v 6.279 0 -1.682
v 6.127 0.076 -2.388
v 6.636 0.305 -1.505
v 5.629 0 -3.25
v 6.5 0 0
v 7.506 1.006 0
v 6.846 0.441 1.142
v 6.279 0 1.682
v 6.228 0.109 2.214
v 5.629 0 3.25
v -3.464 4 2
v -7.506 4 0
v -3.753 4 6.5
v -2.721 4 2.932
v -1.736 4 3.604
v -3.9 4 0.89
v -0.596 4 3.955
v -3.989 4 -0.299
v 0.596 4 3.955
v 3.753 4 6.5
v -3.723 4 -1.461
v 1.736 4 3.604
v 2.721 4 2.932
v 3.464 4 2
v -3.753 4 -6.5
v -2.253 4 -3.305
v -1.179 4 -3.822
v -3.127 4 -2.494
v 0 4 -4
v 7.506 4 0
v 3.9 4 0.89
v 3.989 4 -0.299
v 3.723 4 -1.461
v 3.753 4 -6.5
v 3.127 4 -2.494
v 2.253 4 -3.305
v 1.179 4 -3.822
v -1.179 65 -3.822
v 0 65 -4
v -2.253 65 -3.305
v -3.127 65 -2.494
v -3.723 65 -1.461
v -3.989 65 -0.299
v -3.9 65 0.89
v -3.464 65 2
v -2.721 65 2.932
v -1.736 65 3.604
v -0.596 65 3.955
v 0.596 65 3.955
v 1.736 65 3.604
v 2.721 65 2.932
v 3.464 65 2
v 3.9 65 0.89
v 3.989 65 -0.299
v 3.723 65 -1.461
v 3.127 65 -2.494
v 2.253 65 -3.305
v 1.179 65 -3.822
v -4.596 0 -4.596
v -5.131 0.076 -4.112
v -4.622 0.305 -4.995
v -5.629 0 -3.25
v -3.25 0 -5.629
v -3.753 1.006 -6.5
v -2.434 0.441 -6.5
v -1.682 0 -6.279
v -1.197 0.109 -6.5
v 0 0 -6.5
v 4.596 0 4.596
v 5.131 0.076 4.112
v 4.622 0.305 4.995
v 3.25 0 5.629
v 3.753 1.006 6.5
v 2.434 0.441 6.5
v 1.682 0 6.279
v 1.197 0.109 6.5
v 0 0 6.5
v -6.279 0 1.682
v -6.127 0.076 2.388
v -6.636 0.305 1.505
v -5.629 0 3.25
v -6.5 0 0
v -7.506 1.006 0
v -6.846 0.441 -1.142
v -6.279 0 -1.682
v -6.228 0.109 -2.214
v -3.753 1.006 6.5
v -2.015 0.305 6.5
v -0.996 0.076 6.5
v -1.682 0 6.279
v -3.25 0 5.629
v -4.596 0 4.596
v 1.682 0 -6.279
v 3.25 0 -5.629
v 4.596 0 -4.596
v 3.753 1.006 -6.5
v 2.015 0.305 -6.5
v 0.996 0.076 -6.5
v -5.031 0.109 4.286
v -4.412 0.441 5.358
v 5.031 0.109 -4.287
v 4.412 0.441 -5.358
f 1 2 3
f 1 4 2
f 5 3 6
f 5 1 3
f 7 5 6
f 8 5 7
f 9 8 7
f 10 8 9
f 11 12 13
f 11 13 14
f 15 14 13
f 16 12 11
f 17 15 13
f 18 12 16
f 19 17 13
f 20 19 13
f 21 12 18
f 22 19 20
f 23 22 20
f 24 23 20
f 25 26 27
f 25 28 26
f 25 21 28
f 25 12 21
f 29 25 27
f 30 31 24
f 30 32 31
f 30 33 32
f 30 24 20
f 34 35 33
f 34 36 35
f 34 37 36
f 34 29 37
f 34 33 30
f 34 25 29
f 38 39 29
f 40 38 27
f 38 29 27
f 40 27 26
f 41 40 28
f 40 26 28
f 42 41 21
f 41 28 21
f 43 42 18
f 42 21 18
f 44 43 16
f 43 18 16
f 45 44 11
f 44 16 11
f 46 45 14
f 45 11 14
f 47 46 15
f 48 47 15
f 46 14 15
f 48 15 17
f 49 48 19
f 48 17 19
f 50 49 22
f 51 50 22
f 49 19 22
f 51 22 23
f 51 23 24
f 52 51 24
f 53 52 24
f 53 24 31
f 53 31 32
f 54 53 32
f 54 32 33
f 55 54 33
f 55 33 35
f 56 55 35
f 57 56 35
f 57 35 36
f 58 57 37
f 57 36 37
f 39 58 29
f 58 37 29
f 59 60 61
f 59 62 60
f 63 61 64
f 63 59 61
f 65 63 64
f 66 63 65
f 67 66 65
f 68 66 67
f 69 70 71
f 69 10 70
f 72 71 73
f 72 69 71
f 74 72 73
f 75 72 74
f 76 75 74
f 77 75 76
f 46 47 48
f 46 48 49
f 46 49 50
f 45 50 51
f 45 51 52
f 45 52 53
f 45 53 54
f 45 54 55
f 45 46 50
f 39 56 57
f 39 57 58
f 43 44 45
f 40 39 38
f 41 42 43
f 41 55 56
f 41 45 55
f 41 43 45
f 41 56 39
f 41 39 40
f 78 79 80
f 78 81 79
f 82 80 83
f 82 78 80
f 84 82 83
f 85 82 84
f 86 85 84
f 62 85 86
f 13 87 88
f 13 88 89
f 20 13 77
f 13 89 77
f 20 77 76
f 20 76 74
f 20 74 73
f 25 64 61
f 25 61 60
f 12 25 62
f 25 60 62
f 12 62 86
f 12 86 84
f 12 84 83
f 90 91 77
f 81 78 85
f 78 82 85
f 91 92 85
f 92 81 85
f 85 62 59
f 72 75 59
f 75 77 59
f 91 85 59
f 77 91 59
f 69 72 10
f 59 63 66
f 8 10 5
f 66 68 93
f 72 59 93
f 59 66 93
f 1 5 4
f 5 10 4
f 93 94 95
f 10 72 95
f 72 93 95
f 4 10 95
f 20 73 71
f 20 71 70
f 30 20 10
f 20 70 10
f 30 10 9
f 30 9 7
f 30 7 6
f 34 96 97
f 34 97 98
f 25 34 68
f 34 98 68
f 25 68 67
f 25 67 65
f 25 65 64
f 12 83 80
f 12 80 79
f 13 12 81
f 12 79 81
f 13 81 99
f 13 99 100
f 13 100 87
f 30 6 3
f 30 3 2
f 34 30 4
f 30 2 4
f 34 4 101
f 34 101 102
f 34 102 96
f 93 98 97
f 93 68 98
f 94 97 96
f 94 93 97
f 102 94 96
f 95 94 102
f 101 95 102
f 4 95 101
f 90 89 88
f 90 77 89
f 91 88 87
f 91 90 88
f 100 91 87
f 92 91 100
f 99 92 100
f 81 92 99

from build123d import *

# Parameters (mm, degrees)
BOSS_EXTRUDE1_DEPTH = 4
SKETCH2_OUTSIDE_W   = 44.472
SKETCH2_OUTSIDE_H   = 42.46
SKETCH2_OUTSIDE_R   = 6.5
CUT_EXTRUDE2_DEPTH  = 11.704360482
CUT_EXTRUDE2_DRAFT  = -45
SKETCH3_R           = 4
BOSS_EXTRUDE2_DEPTH = 61


with BuildPart() as part:
    # Sketch1 → Boss-Extrude1 (new body)
    with BuildSketch(Plane(origin=(0, 0, 0), x_dir=(1, 0, 0), z_dir=(0, 1, 0))):
        Polygon((7.505553499, 0), (3.75277675, 6.5), (-3.75277675, 6.5), (-7.505553499, 0), (-3.75277675, -6.5), (3.75277675, -6.5), align=None)
    extrude(amount=BOSS_EXTRUDE1_DEPTH)


with BuildPart() as cut_extrude2_tool:
    # Sketch2 outside → Cut-Extrude2 (with draft: the straight prism first)
    with BuildSketch(Plane(origin=(0, 0, 0), x_dir=(-1, 0, 0), z_dir=(0, -1, 0))):
        Rectangle(SKETCH2_OUTSIDE_W, SKETCH2_OUTSIDE_H)
        Circle(SKETCH2_OUTSIDE_R, mode=Mode.SUBTRACT)
    extrude(amount=-CUT_EXTRUDE2_DEPTH)
    # Cut-Extrude2: the draft: its side faces are tilted about the plane it starts from
    cut_extrude2_sides = [cut_extrude2_tool.faces().sort_by_distance(p)[0] for p in [
        (0, 5.852180241, 21.23),
        (-22.236, 5.852180241, 0),
        (0, 5.852180241, -21.23),
        (22.236, 5.852180241, 0),
        (6.5, 5.852180241, 0),
    ]]
    draft(cut_extrude2_sides, Plane(origin=(0, 0, 0), x_dir=(-1, 0, 0), z_dir=(0, -1, 0)), CUT_EXTRUDE2_DRAFT)


with BuildPart() as part_1:
    add(part.part)

    # Cut-Extrude2: cut by cut_extrude2_tool
    add(cut_extrude2_tool.part, mode=Mode.SUBTRACT)

    # Sketch3 → Boss-Extrude2 (add)
    with BuildSketch(Plane(origin=(0, 4, 0), x_dir=(1, 0, 0), z_dir=(0, 1, 0))):
        with Locations(Location((0, 0, 0), (0, 0, 90))):
            Circle(SKETCH3_R)
    extrude(amount=BOSS_EXTRUDE2_DEPTH)


solid = part_1.part
